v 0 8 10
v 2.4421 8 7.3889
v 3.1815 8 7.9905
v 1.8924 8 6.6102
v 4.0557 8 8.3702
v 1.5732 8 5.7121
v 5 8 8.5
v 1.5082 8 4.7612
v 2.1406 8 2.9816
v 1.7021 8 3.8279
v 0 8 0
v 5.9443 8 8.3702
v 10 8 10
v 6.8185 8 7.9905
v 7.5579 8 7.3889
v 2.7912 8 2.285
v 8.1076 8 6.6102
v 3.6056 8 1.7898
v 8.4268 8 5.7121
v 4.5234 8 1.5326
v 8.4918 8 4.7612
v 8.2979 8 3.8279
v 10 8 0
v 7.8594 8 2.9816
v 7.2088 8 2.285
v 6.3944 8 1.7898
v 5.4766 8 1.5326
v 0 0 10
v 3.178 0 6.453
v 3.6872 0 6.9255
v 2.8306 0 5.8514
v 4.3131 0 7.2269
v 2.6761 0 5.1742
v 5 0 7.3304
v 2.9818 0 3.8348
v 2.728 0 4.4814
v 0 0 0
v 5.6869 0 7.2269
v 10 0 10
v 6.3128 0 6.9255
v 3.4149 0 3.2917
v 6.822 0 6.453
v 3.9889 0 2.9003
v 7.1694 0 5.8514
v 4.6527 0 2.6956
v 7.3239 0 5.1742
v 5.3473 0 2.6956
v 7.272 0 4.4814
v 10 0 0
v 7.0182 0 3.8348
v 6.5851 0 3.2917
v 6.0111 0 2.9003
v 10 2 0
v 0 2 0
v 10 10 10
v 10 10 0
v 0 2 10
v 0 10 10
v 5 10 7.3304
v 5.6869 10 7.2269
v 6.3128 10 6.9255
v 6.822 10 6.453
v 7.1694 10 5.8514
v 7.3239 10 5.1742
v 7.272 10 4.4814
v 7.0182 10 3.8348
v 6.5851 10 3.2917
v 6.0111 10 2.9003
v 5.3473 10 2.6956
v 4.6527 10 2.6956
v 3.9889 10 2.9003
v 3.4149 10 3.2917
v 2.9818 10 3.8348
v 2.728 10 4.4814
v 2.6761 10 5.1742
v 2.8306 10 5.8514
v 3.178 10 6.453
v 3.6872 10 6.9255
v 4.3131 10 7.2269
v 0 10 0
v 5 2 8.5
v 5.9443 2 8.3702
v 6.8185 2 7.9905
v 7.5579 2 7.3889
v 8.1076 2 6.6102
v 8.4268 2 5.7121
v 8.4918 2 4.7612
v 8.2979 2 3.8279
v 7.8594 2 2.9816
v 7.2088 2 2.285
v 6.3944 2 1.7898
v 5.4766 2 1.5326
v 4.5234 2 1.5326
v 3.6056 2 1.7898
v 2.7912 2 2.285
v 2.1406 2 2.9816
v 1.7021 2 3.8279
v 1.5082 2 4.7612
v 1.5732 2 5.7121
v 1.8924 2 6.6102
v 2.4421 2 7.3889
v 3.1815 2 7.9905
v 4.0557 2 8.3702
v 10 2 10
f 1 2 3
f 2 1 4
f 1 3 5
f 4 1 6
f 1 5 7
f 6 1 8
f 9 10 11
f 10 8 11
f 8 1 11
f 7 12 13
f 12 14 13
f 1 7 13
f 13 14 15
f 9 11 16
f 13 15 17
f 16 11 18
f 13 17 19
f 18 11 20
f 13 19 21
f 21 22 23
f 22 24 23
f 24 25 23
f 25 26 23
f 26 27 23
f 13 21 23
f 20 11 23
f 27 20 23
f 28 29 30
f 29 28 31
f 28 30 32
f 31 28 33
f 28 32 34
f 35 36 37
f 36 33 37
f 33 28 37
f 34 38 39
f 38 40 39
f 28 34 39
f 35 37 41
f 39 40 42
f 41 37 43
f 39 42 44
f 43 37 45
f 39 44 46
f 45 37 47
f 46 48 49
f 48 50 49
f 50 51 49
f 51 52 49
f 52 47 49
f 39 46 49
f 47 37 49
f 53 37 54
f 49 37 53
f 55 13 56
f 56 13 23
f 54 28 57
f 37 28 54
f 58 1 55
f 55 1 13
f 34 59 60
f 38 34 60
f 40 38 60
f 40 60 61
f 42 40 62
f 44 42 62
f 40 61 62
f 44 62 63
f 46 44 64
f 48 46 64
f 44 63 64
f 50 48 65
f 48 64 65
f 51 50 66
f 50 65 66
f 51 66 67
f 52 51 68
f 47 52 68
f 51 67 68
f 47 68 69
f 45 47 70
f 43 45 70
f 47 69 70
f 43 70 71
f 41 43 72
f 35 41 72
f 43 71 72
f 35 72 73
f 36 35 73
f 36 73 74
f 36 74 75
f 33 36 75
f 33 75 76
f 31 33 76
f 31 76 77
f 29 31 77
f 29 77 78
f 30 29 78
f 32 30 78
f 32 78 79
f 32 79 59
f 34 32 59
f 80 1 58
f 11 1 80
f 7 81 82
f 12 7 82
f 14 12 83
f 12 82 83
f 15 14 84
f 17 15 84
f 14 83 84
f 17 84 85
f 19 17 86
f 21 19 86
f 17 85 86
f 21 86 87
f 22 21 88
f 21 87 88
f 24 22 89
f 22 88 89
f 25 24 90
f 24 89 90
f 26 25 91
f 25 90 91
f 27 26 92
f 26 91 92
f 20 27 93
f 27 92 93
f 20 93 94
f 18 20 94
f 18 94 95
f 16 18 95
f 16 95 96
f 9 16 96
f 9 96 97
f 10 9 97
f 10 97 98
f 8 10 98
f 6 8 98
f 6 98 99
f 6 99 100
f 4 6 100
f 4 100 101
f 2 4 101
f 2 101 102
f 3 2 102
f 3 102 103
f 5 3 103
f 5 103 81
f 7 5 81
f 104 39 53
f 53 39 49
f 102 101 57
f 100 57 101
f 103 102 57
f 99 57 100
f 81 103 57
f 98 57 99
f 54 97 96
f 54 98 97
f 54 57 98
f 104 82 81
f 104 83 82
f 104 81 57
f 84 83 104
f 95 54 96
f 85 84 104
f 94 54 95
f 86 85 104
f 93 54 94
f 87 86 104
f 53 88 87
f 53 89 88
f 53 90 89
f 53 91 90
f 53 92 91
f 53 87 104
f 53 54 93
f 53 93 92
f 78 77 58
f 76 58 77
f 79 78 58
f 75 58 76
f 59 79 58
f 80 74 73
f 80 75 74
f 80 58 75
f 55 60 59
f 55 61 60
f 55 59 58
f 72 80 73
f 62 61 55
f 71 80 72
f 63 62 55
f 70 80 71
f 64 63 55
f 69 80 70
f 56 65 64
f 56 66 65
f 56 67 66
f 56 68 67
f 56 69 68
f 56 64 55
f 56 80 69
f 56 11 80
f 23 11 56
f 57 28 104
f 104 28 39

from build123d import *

# Parameters (mm, degrees)
SKETCH1_W           = 10
SKETCH1_H           = 10
SKETCH1_R           = 3.5
BOSS_EXTRUDE1_DEPTH = 2
SKETCH1_2_R         = 3.5
BOSS_EXTRUDE2_DEPTH = 10
BOSS_EXTRUDE4_START = 8
SKETCH1_4_W         = 10
SKETCH1_4_H         = 10
SKETCH1_4_R         = 3.5
BOSS_EXTRUDE4_DEPTH = 2
SKETCH2_R           = 2.330446687
CUT_EXTRUDE1_DEPTH  = 18.320508076


with BuildPart() as part:
    # Sketch1 → Boss-Extrude1 (new body)
    with BuildSketch(Plane(origin=(0, 0, 0), x_dir=(1, 0, 0), z_dir=(0, 1, 0))):
        with Locations((5, -5)):
            Rectangle(SKETCH1_W, SKETCH1_H)
        with Locations(Location((5, -5, 0), (0, 0, 270))):
            Circle(SKETCH1_R, mode=Mode.SUBTRACT)
    extrude(amount=BOSS_EXTRUDE1_DEPTH)

    # Sketch1<2> → Boss-Extrude2 (add)
    with BuildSketch(Plane(origin=(0, 0, 0), x_dir=(1, 0, 0), z_dir=(0, 1, 0))):
        with Locations(Location((5, -5, 0), (0, 0, 270))):
            Circle(SKETCH1_2_R)
    extrude(amount=BOSS_EXTRUDE2_DEPTH)

    # Sketch1<4> → Boss-Extrude4 (add)
    with BuildSketch(Plane(origin=(0, 0, 0), x_dir=(1, 0, 0), z_dir=(0, 1, 0)).offset(BOSS_EXTRUDE4_START)):
        with Locations((5, -5)):
            Rectangle(SKETCH1_4_W, SKETCH1_4_H)
        with Locations(Location((5, -5, 0), (0, 0, 270))):
            Circle(SKETCH1_4_R, mode=Mode.SUBTRACT)
    extrude(amount=BOSS_EXTRUDE4_DEPTH)

    # Sketch2 → Cut-Extrude1 (cut, through all)
    with BuildSketch(Plane(origin=(0, 10, 0), x_dir=(1, 0, 0), z_dir=(0, 1, 0))):
        with Locations(Location((5, -5, 0), (0, 0, 270))):
            Circle(SKETCH2_R)
    extrude(amount=-CUT_EXTRUDE1_DEPTH, mode=Mode.SUBTRACT)


solid = part.part
